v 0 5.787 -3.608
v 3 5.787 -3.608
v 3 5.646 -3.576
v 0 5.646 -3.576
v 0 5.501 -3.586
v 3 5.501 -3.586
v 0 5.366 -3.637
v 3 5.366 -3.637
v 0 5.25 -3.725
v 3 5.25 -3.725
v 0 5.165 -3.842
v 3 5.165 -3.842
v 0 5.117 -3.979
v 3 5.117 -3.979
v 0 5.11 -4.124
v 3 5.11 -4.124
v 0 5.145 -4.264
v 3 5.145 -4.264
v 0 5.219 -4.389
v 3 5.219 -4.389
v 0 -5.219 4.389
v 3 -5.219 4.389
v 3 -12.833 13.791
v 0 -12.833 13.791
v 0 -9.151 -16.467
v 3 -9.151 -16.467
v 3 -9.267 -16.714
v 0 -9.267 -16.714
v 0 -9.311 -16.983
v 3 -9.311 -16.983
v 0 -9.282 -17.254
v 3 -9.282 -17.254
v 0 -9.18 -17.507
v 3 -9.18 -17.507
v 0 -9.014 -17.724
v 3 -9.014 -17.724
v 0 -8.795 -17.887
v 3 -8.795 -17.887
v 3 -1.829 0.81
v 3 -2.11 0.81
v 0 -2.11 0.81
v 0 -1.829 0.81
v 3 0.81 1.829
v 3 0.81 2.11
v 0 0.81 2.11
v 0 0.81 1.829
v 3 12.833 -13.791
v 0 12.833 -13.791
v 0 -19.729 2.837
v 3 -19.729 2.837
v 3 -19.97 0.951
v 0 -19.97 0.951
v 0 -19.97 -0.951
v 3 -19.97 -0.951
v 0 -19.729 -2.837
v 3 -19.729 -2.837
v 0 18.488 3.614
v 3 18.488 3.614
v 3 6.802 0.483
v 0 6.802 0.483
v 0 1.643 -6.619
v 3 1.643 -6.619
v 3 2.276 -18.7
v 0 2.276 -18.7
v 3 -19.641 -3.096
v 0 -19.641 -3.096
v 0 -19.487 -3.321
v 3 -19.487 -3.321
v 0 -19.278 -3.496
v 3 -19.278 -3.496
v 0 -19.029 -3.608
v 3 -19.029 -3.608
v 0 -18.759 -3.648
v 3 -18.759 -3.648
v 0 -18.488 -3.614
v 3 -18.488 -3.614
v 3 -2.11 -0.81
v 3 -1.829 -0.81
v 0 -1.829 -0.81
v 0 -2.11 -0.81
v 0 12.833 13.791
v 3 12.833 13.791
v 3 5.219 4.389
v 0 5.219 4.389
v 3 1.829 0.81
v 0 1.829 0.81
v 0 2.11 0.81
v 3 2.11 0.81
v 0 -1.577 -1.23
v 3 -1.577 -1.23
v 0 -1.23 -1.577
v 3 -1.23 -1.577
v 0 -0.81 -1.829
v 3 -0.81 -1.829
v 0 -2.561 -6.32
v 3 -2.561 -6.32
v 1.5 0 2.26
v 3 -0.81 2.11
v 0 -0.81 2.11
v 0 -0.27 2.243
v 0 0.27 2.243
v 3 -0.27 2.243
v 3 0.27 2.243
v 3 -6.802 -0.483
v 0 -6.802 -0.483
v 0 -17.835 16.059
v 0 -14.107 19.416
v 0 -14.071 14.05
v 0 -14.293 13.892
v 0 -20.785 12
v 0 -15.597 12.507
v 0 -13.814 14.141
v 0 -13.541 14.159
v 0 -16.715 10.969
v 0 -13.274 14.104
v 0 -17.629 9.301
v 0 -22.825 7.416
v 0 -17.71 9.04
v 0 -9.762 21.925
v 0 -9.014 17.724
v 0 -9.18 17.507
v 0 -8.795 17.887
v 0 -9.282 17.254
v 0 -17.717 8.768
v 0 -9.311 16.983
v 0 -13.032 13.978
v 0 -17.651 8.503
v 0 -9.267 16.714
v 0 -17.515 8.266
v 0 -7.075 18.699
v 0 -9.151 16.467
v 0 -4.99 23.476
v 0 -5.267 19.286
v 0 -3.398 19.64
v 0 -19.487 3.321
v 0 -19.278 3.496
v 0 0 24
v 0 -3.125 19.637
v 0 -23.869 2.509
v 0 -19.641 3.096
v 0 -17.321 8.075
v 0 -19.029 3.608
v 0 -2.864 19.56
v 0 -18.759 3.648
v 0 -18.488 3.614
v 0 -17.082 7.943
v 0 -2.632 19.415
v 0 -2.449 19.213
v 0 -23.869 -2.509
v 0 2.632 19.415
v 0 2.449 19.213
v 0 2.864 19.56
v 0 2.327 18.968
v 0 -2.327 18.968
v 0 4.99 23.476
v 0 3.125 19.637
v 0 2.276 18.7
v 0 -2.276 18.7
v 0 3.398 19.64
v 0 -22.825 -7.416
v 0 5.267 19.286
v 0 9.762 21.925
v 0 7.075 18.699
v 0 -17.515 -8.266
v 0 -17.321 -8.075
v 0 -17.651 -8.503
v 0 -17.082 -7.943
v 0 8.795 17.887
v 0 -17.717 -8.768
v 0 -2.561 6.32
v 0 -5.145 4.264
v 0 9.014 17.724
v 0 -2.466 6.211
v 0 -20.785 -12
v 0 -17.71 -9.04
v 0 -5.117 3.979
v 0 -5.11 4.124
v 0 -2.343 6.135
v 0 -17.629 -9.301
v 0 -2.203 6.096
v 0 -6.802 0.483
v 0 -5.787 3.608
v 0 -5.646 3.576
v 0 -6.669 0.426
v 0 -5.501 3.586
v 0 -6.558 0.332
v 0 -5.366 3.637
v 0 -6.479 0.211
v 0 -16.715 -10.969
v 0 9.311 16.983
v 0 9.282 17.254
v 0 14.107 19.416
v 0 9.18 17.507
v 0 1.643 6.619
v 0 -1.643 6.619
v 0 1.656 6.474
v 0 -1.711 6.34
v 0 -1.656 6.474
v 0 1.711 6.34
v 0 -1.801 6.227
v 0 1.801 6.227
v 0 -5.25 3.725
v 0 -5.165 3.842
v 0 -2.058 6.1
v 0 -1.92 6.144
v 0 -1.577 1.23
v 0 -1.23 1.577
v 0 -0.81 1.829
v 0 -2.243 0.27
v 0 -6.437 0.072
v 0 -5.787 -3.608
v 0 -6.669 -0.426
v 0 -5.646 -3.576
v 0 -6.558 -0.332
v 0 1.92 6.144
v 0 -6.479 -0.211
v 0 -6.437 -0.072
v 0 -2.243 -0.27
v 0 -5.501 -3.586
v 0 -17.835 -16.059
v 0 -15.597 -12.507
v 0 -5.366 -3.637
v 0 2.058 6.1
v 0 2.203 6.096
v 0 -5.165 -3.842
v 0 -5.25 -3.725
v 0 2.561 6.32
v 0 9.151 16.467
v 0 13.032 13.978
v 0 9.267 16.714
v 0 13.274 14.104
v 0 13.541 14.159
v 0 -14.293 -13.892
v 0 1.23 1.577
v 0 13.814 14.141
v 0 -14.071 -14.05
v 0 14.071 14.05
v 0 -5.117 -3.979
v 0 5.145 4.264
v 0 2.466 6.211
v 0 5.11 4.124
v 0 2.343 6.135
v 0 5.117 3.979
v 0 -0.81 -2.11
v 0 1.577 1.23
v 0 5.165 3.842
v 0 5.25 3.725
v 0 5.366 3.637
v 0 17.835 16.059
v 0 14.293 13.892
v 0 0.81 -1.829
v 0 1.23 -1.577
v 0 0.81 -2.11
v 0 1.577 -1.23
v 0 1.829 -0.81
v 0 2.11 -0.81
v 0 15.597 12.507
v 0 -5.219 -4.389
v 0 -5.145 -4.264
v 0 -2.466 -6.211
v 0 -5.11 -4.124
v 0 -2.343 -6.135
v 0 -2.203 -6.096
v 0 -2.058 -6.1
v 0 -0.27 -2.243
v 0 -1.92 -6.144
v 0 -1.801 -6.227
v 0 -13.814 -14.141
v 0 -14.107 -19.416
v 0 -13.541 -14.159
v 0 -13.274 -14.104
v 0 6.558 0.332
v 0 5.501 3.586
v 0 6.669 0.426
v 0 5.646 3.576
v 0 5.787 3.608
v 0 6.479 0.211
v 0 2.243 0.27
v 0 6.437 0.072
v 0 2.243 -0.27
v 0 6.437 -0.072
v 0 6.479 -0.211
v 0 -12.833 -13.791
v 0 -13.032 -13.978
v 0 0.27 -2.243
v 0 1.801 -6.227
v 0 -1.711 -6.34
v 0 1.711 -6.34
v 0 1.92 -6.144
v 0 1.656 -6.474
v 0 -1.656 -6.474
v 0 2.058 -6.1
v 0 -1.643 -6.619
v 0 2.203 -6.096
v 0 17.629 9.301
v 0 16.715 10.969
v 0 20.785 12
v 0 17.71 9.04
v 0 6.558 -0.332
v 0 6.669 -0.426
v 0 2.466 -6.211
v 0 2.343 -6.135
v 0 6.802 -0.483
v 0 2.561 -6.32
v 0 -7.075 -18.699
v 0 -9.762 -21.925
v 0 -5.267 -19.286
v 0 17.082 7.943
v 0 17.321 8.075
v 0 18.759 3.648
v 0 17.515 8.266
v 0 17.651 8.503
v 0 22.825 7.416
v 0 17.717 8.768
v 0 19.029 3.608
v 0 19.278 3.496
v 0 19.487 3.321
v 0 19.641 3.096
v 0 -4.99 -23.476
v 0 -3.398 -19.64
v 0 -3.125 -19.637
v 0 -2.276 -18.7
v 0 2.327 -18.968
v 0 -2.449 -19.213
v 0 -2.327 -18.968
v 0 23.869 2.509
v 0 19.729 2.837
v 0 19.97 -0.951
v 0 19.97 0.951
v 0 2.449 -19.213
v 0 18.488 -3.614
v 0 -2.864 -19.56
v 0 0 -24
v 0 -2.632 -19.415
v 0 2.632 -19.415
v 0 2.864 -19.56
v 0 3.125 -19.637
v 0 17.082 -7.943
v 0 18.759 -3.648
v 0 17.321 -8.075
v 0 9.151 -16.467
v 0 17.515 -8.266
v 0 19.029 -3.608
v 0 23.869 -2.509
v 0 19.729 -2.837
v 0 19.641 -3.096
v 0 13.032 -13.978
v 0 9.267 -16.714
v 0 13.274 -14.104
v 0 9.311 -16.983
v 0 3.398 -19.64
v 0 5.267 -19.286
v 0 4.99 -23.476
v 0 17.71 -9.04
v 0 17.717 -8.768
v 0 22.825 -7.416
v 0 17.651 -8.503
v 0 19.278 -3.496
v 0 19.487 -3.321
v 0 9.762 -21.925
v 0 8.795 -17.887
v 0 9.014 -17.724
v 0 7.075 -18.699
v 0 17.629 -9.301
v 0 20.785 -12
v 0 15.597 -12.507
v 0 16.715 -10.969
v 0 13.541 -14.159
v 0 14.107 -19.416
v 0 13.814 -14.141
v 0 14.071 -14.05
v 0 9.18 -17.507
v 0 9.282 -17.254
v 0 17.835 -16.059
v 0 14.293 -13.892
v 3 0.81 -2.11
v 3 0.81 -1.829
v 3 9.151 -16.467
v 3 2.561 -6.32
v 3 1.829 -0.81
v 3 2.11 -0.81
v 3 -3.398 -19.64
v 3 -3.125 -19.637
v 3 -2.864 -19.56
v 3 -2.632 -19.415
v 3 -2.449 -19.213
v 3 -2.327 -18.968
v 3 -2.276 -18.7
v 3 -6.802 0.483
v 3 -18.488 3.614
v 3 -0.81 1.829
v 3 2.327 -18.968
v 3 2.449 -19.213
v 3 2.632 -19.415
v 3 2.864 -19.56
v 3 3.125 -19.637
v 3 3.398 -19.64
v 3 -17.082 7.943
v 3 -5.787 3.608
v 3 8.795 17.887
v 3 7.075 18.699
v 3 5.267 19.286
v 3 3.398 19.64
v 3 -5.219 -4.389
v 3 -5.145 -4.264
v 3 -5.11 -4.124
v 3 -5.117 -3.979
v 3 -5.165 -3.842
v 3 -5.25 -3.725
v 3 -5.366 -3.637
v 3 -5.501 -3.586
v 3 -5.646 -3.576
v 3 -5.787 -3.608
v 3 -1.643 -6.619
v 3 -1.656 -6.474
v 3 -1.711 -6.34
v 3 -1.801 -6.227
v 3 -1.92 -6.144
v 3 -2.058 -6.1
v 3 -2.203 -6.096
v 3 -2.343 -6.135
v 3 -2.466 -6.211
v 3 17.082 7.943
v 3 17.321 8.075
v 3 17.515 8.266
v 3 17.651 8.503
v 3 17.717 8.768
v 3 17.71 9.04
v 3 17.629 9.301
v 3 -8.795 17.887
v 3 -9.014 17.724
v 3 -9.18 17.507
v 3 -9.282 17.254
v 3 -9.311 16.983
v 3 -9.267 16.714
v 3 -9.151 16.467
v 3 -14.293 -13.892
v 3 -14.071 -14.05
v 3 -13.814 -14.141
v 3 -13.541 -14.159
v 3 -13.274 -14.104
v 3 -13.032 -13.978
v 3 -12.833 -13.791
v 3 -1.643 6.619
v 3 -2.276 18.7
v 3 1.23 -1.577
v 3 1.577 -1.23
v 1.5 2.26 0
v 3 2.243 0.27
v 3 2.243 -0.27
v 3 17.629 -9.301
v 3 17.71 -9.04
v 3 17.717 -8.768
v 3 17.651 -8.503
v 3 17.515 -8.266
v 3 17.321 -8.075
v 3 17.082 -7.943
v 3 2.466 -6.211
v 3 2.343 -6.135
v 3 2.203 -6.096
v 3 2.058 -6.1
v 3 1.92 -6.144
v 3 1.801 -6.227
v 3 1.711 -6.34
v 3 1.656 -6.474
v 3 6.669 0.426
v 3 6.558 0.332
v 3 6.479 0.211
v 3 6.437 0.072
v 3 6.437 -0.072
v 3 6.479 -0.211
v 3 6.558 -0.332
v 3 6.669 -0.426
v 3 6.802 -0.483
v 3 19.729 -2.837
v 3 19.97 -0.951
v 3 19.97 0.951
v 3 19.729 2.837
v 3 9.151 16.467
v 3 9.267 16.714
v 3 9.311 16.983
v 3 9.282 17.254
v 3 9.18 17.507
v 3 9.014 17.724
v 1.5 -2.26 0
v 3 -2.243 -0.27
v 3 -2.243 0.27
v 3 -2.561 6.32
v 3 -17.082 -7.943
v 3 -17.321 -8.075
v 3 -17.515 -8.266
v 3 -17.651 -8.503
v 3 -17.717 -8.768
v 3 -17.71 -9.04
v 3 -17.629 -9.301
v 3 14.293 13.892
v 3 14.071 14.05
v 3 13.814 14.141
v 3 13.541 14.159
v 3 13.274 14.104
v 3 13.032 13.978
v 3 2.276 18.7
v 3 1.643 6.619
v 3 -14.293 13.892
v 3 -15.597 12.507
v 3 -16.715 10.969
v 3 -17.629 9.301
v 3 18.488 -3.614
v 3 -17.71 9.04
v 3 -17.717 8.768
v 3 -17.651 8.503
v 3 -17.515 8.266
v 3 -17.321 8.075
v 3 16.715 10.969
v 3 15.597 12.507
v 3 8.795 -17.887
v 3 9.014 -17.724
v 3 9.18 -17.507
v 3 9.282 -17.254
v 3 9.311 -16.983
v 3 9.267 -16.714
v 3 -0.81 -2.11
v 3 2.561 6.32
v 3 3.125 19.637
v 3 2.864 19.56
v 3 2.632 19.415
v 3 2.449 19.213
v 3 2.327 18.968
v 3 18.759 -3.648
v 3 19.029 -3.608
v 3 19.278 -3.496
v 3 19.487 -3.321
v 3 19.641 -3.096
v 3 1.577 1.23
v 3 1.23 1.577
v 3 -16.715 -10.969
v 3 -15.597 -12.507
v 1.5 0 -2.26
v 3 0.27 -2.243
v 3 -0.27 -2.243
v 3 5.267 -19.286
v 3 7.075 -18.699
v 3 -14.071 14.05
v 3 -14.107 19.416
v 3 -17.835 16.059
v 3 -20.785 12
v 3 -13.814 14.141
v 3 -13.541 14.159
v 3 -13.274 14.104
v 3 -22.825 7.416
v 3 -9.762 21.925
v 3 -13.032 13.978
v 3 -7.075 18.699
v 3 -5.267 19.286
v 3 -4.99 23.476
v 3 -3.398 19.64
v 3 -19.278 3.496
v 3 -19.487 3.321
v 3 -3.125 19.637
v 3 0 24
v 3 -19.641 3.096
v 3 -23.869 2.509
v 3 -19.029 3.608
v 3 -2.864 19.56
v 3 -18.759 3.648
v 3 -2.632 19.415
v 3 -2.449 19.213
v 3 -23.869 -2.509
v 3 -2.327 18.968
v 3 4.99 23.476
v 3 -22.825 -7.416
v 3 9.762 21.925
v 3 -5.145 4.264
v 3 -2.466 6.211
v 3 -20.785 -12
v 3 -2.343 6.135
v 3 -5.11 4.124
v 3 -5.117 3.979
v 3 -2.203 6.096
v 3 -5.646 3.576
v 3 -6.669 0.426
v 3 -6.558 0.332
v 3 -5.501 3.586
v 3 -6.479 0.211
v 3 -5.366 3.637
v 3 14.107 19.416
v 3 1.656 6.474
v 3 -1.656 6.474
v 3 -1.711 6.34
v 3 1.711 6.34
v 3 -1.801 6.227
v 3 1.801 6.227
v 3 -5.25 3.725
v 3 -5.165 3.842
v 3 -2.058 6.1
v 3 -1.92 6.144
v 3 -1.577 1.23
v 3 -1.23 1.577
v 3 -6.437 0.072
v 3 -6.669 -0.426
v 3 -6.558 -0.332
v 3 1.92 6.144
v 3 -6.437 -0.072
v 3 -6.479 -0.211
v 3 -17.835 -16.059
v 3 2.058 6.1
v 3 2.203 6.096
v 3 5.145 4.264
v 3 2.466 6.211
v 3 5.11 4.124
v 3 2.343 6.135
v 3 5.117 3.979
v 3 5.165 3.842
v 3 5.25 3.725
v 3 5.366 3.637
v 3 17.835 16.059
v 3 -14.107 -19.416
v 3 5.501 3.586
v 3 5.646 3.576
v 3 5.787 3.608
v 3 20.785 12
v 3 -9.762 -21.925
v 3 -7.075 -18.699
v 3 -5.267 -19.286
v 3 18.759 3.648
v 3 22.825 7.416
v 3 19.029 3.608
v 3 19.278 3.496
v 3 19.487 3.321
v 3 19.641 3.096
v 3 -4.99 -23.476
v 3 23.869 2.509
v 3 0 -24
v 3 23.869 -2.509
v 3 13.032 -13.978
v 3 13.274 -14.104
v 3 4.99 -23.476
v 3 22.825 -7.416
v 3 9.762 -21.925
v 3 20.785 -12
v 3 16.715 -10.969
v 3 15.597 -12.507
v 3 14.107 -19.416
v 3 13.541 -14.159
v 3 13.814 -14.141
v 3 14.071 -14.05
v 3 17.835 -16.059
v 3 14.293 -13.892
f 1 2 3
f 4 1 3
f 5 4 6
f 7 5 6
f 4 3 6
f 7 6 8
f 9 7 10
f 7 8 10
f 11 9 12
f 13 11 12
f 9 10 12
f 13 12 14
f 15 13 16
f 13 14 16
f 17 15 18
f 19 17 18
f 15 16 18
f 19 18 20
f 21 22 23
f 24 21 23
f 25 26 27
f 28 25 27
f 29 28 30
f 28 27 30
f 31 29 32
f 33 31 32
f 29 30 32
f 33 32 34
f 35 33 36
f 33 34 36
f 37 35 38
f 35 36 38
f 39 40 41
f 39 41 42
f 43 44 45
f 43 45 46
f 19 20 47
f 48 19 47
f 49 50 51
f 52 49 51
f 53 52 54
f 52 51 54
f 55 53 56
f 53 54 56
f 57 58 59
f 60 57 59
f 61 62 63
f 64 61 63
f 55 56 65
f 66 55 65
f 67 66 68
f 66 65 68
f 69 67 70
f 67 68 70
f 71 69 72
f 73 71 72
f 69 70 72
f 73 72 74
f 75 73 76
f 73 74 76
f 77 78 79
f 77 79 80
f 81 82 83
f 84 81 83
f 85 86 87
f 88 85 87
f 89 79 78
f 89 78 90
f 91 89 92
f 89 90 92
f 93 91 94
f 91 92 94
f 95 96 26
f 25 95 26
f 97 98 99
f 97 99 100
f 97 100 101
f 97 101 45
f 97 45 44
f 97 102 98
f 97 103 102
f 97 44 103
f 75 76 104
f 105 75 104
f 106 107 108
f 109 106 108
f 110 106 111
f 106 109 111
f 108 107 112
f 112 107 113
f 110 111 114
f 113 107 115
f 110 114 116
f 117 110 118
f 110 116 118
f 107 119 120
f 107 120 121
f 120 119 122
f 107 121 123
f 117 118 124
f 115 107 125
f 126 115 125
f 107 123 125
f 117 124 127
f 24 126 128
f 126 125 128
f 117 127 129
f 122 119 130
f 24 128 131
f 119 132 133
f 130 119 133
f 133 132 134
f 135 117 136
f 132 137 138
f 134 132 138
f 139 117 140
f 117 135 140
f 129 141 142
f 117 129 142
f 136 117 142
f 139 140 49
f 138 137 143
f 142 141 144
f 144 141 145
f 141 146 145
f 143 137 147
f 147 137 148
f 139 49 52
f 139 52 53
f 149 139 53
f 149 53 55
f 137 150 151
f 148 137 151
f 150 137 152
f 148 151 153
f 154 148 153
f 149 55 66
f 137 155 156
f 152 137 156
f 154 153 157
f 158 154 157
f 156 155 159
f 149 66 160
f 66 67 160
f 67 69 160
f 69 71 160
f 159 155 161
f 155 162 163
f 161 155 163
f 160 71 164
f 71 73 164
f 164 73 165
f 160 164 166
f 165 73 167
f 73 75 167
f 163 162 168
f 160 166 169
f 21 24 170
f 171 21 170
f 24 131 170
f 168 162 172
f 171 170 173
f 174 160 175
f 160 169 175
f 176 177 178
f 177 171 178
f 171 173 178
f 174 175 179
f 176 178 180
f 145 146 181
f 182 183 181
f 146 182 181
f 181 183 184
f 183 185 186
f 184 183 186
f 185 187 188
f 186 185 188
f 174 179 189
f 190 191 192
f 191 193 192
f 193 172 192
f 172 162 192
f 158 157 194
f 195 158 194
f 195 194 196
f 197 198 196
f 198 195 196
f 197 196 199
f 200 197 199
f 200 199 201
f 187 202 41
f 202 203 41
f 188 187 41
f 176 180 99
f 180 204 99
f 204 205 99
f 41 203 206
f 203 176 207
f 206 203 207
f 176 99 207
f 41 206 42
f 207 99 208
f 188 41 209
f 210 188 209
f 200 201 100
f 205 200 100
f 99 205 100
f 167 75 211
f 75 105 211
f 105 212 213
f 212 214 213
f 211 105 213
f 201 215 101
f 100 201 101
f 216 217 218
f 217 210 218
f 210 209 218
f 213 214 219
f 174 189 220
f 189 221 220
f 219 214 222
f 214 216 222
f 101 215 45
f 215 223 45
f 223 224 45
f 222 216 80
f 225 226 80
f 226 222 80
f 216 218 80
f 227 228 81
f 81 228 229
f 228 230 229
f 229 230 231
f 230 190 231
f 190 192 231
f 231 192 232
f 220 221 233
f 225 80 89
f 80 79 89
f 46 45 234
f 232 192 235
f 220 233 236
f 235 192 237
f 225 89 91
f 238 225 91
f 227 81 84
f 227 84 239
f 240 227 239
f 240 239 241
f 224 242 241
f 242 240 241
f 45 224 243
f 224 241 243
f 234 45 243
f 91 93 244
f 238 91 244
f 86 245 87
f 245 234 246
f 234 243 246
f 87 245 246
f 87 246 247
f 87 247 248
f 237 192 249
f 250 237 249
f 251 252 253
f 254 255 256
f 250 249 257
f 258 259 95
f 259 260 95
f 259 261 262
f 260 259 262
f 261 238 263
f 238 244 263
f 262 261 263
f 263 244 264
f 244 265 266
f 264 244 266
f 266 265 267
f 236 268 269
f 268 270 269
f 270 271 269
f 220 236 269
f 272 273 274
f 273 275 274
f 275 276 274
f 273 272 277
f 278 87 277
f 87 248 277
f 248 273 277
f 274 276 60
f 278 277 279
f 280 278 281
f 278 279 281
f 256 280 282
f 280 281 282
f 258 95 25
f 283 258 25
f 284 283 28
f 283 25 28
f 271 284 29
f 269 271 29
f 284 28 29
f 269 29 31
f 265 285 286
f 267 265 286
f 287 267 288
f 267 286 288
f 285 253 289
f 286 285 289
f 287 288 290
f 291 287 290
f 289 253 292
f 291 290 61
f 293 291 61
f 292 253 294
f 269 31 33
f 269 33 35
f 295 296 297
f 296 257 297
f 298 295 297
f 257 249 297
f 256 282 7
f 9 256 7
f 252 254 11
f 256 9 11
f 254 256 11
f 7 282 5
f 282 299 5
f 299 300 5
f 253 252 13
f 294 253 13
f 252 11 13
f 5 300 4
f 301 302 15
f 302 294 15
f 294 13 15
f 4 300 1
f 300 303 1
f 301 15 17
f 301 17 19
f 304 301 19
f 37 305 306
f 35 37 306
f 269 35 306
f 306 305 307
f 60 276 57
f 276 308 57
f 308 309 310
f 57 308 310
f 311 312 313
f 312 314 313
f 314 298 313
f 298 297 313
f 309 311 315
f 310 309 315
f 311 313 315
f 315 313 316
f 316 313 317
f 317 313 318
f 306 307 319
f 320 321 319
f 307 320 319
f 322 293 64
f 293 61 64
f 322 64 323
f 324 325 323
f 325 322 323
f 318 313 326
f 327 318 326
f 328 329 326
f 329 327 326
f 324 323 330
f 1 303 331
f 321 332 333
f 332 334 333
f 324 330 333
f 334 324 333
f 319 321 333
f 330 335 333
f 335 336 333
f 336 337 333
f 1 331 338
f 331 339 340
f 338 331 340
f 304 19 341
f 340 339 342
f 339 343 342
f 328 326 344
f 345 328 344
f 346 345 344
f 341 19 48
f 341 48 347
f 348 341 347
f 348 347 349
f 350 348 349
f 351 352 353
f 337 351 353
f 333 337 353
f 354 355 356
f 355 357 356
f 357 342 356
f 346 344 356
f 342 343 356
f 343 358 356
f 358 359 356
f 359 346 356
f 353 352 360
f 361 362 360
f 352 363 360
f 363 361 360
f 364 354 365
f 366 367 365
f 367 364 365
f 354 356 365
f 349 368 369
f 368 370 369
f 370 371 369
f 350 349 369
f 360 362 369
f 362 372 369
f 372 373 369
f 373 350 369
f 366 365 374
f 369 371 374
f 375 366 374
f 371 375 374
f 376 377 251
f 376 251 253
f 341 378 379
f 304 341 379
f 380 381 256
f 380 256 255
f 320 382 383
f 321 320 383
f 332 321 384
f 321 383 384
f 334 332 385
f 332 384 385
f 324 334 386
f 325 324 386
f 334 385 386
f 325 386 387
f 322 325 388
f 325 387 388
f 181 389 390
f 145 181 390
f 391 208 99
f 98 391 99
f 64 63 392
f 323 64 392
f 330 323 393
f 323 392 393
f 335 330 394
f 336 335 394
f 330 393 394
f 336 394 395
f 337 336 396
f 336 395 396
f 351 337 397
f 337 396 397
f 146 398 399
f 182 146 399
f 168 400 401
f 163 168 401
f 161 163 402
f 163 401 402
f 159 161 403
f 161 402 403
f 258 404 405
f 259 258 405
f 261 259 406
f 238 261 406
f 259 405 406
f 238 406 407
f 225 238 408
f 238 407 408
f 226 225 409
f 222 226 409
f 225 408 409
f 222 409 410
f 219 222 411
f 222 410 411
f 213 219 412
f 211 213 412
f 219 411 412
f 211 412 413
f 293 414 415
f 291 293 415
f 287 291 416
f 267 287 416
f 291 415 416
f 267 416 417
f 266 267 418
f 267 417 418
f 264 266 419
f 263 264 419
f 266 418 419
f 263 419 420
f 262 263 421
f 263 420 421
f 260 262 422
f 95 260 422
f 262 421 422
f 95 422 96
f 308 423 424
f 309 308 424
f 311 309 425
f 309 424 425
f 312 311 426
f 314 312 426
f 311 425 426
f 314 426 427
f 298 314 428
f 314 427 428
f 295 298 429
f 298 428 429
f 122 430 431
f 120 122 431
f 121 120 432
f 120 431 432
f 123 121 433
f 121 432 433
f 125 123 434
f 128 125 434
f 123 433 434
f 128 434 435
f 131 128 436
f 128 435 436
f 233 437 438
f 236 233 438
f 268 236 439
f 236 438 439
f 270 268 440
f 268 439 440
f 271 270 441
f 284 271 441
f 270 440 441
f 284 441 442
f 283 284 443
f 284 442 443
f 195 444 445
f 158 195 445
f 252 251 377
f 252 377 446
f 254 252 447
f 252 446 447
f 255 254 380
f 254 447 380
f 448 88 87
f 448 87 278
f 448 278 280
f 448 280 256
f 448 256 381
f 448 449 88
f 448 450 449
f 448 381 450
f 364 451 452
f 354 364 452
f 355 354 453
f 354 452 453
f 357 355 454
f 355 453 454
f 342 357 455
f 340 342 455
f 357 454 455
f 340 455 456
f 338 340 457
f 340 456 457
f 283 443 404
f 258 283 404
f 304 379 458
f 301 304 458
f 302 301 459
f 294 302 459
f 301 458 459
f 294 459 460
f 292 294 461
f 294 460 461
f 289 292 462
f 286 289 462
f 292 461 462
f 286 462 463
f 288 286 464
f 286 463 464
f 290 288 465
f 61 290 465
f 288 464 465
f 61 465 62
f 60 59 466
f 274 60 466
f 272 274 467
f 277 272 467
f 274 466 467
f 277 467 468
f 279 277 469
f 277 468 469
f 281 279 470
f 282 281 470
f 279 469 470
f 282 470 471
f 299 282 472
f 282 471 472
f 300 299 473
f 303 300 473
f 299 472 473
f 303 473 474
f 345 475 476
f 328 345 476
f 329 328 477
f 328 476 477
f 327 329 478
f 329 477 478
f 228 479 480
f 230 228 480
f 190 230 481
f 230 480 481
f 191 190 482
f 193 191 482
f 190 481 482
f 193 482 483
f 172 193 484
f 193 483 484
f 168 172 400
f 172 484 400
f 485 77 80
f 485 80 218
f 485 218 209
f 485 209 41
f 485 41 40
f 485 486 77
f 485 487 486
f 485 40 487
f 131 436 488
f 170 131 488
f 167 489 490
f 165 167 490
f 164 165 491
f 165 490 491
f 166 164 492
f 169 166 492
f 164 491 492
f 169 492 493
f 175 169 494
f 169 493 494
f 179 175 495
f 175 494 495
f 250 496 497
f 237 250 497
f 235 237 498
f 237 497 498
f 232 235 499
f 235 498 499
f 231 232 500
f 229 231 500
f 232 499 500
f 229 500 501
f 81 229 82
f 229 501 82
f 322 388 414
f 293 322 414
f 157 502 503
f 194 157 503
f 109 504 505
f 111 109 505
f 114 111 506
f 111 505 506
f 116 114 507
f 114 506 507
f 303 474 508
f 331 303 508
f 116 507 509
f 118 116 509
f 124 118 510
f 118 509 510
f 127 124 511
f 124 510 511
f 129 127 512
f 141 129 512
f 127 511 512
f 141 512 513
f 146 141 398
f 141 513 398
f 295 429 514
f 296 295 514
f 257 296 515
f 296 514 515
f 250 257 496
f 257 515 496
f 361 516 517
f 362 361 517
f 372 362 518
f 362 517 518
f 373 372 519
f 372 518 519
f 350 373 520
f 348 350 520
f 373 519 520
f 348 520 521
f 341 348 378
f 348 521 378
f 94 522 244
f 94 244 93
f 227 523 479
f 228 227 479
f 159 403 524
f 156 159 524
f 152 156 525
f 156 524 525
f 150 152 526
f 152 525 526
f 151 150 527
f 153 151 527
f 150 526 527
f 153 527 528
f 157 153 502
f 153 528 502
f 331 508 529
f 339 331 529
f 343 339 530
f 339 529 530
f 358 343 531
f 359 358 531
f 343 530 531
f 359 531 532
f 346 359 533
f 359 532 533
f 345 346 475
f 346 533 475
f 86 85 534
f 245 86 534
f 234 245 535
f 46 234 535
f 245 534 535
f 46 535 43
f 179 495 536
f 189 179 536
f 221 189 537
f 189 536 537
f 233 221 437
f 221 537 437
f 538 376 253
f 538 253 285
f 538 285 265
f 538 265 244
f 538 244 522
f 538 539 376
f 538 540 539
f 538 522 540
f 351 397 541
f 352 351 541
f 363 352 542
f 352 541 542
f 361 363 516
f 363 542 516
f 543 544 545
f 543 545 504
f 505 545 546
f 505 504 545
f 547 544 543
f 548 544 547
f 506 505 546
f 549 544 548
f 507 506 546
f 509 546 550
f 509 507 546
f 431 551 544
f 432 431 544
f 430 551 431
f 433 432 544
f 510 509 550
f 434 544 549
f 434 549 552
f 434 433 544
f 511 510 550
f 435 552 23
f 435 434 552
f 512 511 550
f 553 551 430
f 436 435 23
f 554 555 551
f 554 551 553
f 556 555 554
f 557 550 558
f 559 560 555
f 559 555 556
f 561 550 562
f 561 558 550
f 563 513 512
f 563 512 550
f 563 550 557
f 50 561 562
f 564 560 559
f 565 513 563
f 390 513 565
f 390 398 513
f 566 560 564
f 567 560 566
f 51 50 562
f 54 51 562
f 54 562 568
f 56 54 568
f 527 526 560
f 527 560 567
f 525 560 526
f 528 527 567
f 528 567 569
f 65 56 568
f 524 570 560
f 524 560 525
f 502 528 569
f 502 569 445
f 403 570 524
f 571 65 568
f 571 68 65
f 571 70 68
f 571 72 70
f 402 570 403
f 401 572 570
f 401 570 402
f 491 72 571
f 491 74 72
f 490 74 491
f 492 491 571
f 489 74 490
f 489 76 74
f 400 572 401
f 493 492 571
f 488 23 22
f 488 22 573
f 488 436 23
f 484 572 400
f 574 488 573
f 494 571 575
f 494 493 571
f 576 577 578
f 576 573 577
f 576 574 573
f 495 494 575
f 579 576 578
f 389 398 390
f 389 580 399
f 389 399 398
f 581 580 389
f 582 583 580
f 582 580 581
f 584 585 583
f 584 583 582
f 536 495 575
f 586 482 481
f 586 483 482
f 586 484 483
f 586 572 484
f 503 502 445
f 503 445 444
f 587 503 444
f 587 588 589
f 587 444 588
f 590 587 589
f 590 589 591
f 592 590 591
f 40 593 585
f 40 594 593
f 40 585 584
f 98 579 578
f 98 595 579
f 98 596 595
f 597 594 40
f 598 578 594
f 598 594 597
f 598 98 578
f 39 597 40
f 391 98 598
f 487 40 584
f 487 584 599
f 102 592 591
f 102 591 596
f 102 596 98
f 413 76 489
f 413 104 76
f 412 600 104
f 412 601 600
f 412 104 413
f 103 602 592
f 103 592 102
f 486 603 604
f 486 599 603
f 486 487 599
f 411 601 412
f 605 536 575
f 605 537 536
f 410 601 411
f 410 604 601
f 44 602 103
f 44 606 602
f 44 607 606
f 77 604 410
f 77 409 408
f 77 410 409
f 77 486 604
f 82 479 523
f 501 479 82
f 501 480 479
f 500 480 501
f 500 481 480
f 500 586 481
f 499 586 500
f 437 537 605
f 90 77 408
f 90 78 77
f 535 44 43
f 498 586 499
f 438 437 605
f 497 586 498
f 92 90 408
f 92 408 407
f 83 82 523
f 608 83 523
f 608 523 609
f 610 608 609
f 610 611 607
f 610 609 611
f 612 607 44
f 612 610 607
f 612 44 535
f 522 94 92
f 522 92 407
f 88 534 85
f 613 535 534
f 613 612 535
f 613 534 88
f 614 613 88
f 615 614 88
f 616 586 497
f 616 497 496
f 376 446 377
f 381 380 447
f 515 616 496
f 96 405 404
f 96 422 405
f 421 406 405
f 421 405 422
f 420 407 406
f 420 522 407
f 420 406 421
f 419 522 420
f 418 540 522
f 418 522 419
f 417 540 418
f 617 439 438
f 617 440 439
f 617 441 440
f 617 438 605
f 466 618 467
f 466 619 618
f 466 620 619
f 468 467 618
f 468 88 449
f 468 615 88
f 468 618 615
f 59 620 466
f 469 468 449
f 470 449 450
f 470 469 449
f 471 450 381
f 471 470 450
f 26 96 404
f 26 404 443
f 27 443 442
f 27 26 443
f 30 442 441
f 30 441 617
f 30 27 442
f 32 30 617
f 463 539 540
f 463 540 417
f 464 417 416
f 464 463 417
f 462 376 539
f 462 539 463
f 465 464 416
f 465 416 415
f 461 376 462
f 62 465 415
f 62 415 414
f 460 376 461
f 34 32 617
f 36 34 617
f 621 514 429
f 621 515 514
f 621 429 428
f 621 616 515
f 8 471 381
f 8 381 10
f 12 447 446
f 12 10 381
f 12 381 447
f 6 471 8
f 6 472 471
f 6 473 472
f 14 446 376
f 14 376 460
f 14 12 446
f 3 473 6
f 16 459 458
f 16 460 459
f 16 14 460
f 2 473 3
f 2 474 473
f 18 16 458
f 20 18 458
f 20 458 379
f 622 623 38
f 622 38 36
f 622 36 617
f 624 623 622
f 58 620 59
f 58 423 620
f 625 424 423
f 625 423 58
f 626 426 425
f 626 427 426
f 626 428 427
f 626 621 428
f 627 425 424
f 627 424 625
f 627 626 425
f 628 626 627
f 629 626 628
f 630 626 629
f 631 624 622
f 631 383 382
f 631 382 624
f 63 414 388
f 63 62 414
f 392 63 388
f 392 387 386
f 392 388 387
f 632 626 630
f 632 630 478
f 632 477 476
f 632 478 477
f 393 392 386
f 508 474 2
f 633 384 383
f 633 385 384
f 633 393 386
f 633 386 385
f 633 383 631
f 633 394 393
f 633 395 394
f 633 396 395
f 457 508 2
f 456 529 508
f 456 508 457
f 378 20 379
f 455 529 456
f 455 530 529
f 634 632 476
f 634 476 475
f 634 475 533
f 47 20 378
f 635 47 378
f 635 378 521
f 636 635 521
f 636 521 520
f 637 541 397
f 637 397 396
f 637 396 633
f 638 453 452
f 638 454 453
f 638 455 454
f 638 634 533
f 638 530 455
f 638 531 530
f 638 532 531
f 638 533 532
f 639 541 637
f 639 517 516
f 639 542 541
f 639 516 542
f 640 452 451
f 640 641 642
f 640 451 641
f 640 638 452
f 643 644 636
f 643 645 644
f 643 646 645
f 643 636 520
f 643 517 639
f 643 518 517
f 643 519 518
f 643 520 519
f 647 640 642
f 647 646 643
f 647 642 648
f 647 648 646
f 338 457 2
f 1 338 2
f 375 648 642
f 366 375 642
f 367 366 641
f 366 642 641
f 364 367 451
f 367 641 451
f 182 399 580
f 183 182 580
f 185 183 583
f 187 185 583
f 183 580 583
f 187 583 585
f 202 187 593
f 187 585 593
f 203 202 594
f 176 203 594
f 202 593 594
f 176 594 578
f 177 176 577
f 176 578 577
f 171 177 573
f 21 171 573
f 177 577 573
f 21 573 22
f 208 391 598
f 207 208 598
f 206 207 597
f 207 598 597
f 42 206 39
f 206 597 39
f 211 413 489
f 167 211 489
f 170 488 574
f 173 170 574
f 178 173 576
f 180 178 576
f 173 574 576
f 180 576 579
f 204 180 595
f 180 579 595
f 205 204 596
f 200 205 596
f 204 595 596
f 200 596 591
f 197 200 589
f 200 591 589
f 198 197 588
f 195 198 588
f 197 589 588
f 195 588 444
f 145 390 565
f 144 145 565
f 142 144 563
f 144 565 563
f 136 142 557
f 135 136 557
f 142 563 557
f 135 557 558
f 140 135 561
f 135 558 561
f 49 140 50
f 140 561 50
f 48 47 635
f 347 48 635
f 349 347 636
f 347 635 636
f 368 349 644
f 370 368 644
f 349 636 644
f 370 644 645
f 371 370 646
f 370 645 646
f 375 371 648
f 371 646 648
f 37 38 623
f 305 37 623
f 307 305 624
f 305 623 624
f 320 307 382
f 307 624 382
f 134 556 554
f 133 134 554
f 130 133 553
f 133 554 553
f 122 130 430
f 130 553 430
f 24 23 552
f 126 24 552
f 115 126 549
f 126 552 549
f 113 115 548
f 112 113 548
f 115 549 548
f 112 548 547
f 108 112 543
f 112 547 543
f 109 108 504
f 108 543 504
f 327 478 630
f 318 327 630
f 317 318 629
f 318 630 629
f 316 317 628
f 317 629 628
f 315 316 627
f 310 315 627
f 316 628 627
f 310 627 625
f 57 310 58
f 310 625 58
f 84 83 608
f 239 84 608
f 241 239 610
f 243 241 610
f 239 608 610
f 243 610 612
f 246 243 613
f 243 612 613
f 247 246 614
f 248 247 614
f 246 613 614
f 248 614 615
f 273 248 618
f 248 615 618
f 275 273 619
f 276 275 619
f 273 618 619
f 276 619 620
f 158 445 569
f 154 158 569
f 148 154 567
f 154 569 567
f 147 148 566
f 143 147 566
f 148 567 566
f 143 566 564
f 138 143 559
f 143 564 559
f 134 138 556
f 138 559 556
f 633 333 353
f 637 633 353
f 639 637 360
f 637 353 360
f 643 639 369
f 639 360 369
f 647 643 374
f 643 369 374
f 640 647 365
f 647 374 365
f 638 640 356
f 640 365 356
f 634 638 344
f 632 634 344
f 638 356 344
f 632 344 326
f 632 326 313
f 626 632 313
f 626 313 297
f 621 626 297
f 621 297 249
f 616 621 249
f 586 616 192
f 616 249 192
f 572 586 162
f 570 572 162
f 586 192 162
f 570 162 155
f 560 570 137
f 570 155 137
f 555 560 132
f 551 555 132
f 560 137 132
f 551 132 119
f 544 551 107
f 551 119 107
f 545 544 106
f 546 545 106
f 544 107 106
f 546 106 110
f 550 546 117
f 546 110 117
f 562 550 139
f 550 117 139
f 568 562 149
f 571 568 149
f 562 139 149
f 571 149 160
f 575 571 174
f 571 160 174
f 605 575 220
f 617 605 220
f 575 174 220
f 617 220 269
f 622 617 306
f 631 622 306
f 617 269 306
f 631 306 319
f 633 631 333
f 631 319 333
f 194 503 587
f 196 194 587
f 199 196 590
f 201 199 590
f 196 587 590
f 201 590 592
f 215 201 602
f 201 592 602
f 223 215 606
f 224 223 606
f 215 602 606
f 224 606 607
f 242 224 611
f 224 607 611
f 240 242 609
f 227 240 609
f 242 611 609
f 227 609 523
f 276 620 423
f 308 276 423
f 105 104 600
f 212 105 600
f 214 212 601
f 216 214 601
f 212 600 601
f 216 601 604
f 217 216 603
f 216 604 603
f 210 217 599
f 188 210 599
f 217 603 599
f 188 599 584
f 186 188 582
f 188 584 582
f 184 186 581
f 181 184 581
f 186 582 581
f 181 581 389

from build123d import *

# Parameters (mm, degrees)
SKETCH1_R           = 24
BOSS_EXTRUDE1_DEPTH = 3
SKETCH2_R           = 2
CUT_EXTRUDE1_DEPTH  = 3
CUT_EXTRUDE2_DEPTH  = 3
CIRPATTERN1_COUNT   = 10
CUT_EXTRUDE4_DEPTH  = 3


with BuildPart() as part:
    # Sketch1 → Boss-Extrude1 (new body)
    with BuildSketch(Plane(origin=(0, 0, 0), x_dir=(0, 0, -1), z_dir=(1, 0, 0))):
        Circle(SKETCH1_R)
    extrude(amount=BOSS_EXTRUDE1_DEPTH)

    # Sketch2 → Cut-Extrude1 (cut)
    with BuildSketch(Plane(origin=(3, 0, 0), x_dir=(0, 0, -1), z_dir=(1, 0, 0))):
        Circle(SKETCH2_R)
    extrude(amount=-CUT_EXTRUDE1_DEPTH, mode=Mode.SUBTRACT)

    # Sketch3 → Cut-Extrude2 (cut)
    with BuildSketch(Plane(origin=(3, 0, 0), x_dir=(0, 0, -1), z_dir=(1, 0, 0))):
        with BuildLine():
            Line((0.482962913, 6.80244213), (3.614211274, 18.488420103))
            ThreePointArc((3.614211274, 18.488420103), (3.495889099, 19.277869009), (2.837448694, 19.729184801))
            ThreePointArc((2.837448694, 19.729184801), (0, 20), (-2.837448694, 19.729184801))
            ThreePointArc((-2.837448694, 19.729184801), (-3.495889099, 19.277869009), (-3.614211274, 18.488420103))
            Line((-3.614211274, 18.488420103), (-0.482962913, 6.80244213))
            ThreePointArc((-0.482962913, 6.80244213), (0, 6.431851653), (0.482962913, 6.80244213))
        make_face()
    cut_extrude2 = extrude(amount=-CUT_EXTRUDE2_DEPTH, mode=Mode.SUBTRACT)

    # CirPattern1: Cut-Extrude2 ×10 about axis
    cirpattern1_axis = Axis((0, 0, 0), (1, 0, 0))
    for i in range(1, CIRPATTERN1_COUNT):
        add(cut_extrude2.rotate(cirpattern1_axis, i * 360 / CIRPATTERN1_COUNT), mode=Mode.SUBTRACT)

    # Sketch5 → Cut-Extrude4 (cut)
    with BuildSketch(Plane(origin=(3, 0, 0), x_dir=(0, 0, -1), z_dir=(1, 0, 0))):
        with BuildLine():
            Line((-2.109857815, 0.81), (-0.81, 0.81))
            Line((-0.81, 0.81), (-0.81, 2.109857815))
            add(Edge.make_bspline(
                [(-0.81, 2.109857815), (0, 2.410142185), (0.81, 2.109857815)],
                knots=[0, 0, 0, 1, 1, 1], degree=2))
            Line((0.81, 2.109857815), (0.81, 0.81))
            Line((0.81, 0.81), (2.109857815, 0.81))
            add(Edge.make_bspline(
                [(2.109857815, 0.81), (2.410142185, 0), (2.109857815, -0.81)],
                knots=[0, 0, 0, 1, 1, 1], degree=2))
            Line((2.109857815, -0.81), (0.81, -0.81))
            Line((0.81, -0.81), (0.81, -2.109857815))
            add(Edge.make_bspline(
                [(0.81, -2.109857815), (0, -2.410142185), (-0.81, -2.109857815)],
                knots=[0, 0, 0, 1, 1, 1], degree=2))
            Line((-0.81, -2.109857815), (-0.81, -0.81))
            Line((-0.81, -0.81), (-2.109857815, -0.81))
            add(Edge.make_bspline(
                [(-2.109857815, -0.81), (-2.410142185, 0), (-2.109857815, 0.81)],
                knots=[0, 0, 0, 1, 1, 1], degree=2))
        make_face()
    extrude(amount=-CUT_EXTRUDE4_DEPTH, mode=Mode.SUBTRACT)


solid = part.part
